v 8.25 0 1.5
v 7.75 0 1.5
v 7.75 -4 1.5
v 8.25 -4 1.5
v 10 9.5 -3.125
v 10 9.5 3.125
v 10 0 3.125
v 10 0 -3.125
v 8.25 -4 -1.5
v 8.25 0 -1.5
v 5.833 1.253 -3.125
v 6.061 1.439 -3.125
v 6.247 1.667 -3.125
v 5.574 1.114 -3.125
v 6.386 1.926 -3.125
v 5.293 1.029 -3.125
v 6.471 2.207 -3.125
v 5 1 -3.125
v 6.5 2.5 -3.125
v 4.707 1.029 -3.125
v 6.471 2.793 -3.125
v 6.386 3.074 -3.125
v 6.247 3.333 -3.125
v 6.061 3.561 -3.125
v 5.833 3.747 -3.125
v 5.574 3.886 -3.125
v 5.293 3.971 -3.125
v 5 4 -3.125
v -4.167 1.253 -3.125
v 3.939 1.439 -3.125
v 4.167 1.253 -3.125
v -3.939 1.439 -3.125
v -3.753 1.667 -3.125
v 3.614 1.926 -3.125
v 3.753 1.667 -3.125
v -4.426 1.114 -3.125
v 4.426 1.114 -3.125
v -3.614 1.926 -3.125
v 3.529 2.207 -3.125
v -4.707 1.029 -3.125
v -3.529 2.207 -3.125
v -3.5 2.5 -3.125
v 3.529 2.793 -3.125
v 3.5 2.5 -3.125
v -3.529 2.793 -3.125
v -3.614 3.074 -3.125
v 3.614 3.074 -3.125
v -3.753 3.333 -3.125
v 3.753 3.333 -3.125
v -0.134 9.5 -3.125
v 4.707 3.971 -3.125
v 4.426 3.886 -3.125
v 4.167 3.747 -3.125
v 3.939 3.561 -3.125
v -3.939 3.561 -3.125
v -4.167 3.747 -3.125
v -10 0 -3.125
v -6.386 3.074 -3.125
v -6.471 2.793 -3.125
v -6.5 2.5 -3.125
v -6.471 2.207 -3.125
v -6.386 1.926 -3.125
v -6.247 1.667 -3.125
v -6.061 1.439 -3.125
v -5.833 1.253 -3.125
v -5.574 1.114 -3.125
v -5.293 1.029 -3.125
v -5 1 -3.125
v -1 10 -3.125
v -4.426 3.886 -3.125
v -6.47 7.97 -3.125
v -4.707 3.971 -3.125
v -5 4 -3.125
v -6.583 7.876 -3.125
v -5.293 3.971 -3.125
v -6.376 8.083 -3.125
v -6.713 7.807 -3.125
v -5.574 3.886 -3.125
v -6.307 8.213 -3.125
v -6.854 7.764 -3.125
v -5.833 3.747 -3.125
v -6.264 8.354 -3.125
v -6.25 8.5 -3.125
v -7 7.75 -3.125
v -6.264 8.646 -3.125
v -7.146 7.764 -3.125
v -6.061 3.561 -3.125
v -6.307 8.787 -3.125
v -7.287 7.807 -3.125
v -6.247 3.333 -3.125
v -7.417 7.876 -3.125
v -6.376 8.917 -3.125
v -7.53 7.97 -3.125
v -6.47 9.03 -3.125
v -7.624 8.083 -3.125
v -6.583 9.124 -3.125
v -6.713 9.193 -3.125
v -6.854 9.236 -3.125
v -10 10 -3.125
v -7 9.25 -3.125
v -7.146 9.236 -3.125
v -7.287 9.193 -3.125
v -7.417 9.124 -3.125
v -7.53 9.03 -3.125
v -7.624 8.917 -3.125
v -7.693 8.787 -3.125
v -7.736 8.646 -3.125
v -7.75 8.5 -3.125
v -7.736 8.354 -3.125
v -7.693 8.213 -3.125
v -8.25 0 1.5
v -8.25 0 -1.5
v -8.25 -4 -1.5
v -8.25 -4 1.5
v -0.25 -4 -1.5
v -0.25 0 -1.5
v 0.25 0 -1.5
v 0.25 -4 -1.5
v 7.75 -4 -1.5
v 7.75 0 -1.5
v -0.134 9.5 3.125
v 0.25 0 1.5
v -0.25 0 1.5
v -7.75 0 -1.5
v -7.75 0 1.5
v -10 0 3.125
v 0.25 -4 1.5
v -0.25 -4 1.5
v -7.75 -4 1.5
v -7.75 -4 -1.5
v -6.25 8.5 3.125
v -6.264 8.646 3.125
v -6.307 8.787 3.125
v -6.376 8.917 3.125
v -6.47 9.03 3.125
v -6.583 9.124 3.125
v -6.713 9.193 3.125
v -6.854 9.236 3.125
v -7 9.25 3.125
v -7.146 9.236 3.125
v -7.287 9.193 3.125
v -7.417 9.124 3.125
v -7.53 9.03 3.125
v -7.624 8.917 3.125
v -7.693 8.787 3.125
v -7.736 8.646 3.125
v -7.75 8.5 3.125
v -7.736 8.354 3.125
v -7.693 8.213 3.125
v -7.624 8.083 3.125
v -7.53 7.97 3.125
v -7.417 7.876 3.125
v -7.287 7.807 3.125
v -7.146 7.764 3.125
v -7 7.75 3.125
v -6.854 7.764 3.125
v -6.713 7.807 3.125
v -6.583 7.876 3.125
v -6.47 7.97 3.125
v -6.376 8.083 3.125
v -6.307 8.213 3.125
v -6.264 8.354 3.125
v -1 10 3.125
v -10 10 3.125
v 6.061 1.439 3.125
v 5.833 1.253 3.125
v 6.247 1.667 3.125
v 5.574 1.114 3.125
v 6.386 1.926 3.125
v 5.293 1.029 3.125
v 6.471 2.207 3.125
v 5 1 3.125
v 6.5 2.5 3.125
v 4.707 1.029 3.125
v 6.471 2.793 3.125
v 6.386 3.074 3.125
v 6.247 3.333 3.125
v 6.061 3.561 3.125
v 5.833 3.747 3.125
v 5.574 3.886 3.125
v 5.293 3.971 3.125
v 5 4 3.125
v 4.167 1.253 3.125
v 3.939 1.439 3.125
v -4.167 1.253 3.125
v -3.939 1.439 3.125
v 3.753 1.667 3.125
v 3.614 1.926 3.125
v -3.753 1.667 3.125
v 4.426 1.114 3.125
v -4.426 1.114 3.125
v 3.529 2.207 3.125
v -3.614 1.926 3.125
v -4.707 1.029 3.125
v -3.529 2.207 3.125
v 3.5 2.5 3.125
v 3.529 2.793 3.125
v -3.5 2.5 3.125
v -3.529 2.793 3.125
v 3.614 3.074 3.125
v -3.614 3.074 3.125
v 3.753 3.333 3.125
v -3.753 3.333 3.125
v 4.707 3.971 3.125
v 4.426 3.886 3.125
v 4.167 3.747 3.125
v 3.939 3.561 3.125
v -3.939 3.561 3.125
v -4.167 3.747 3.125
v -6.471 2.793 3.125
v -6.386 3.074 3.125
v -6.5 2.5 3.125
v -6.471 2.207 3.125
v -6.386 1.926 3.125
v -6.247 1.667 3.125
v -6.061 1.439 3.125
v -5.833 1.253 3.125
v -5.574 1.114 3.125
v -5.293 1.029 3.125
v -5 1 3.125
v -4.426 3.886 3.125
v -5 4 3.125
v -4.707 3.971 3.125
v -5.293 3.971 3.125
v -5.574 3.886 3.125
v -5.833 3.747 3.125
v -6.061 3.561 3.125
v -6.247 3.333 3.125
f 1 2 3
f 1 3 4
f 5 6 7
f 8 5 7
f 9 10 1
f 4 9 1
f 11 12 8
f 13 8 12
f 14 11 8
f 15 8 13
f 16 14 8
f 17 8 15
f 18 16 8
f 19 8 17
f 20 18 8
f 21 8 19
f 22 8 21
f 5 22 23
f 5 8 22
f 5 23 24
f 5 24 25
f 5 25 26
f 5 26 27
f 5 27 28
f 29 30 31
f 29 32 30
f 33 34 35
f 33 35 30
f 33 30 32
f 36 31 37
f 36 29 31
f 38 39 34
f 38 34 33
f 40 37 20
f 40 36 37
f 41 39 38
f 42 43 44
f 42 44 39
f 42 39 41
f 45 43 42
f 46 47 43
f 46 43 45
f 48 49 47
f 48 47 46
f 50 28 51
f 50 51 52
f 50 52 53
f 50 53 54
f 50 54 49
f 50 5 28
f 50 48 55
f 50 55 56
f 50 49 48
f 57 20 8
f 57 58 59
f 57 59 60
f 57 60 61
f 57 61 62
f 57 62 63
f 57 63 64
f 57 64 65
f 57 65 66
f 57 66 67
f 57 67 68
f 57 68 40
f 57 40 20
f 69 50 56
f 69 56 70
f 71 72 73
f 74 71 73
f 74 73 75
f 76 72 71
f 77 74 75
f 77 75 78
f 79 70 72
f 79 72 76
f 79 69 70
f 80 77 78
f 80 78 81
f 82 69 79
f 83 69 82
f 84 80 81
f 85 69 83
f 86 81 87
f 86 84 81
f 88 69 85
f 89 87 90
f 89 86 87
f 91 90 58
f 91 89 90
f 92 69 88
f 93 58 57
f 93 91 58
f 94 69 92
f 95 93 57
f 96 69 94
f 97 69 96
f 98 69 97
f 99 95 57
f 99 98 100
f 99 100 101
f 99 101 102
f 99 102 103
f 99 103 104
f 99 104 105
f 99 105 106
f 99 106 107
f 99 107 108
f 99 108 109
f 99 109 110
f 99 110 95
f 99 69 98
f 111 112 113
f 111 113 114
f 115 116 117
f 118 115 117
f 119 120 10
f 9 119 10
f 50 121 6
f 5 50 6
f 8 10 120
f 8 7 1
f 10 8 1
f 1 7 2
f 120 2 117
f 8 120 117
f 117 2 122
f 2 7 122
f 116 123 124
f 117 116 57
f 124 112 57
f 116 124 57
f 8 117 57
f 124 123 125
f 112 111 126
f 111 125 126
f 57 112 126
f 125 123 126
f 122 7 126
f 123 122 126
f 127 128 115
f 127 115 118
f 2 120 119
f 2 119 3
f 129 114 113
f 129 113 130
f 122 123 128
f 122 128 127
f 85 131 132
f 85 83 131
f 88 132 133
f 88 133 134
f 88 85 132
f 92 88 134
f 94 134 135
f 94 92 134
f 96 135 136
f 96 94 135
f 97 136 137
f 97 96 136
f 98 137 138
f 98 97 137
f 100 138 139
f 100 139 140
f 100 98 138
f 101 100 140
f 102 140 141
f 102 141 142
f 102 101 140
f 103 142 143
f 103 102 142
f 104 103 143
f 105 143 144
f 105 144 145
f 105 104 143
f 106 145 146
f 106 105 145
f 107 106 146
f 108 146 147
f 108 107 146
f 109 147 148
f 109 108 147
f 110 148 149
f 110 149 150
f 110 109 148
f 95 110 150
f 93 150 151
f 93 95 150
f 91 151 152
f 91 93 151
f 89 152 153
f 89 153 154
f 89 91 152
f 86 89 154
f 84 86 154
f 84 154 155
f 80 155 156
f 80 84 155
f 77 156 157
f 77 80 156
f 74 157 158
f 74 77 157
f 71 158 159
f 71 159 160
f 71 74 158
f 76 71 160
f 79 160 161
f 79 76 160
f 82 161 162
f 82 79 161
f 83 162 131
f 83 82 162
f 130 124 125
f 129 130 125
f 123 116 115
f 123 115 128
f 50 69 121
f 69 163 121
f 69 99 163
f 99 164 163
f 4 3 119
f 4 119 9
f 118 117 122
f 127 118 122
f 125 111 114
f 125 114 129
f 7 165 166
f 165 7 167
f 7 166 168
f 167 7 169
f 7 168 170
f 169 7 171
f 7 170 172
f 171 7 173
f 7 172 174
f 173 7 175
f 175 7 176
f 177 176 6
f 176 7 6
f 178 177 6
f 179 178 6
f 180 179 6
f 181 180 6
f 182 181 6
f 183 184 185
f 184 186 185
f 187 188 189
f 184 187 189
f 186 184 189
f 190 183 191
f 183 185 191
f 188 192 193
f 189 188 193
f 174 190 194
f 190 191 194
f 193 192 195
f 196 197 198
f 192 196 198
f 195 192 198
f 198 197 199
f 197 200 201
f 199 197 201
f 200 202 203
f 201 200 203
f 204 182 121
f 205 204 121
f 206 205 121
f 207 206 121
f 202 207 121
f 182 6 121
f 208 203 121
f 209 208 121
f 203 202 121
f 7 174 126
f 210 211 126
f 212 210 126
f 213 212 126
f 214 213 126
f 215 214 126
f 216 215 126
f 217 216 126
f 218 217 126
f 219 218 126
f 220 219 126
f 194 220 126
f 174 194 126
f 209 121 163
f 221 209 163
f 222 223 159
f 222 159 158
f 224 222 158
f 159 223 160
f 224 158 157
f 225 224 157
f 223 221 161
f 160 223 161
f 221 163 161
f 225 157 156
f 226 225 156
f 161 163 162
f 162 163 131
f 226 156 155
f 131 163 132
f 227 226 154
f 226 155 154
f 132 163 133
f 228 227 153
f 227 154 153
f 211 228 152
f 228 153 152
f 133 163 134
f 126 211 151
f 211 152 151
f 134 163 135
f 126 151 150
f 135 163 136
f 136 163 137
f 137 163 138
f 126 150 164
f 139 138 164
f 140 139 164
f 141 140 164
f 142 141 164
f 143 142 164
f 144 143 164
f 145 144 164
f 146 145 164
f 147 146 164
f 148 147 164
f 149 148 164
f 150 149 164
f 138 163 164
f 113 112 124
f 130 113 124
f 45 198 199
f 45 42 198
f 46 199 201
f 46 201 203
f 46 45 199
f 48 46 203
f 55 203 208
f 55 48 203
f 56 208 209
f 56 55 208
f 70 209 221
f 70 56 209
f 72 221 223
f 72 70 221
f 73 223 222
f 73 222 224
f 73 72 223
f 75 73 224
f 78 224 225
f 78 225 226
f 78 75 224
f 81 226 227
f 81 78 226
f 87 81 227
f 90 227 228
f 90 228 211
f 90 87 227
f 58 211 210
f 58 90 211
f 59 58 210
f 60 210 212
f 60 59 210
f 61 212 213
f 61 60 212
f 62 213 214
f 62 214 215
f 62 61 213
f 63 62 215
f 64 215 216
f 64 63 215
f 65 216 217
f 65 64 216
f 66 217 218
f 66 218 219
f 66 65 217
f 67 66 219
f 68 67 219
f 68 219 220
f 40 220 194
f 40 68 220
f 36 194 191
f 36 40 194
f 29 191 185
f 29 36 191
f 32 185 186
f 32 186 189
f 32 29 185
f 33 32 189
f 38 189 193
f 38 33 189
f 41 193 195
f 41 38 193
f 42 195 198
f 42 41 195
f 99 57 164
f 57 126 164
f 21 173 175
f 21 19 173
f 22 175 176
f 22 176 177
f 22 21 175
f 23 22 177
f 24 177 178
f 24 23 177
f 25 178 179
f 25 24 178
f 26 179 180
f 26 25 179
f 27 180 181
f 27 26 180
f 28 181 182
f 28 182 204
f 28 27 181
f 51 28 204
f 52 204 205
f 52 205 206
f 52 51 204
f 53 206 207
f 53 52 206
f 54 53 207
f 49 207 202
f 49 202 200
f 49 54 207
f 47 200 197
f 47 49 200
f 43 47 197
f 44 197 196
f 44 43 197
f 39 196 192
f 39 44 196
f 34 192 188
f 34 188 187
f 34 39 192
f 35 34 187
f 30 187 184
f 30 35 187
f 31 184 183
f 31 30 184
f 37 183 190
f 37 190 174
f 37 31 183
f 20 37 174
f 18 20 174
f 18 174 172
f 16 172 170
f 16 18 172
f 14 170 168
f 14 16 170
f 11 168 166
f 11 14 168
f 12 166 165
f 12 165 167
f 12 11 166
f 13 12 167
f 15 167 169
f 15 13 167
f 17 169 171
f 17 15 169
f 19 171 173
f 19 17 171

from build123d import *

# Parameters (mm, degrees)
SKETCH1_R           = 1.5
SKETCH1_R_2         = 0.75
BOSS_EXTRUDE1_DEPTH = 3.125
SKETCH2_W           = 0.5
SKETCH2_H           = 3
BOSS_EXTRUDE2_DEPTH = 4


with BuildPart() as part:
    # Sketch1 → Boss-Extrude1 (new body, symmetric)
    with BuildSketch(Plane.XY):
        Polygon((10, 0), (-10, 0), (-10, 10), (-1, 10), (-0.133974596, 9.5), (10, 9.5), align=None)
        with Locations((-5, 2.5)):
            Circle(SKETCH1_R, mode=Mode.SUBTRACT)
        with Locations((5, 2.5)):
            Circle(SKETCH1_R, mode=Mode.SUBTRACT)
        with Locations((-7, 8.5)):
            Circle(SKETCH1_R_2, mode=Mode.SUBTRACT)
    extrude(amount=BOSS_EXTRUDE1_DEPTH, both=True)

    # Sketch2 → Boss-Extrude2 (add)
    with BuildSketch(Plane.XZ):
        Rectangle(SKETCH2_W, SKETCH2_H)
        with Locations((-8, 0)):
            Rectangle(SKETCH2_W, SKETCH2_H)
        with Locations((8, 0)):
            Rectangle(SKETCH2_W, SKETCH2_H)
    extrude(amount=BOSS_EXTRUDE2_DEPTH)


solid = part.part
